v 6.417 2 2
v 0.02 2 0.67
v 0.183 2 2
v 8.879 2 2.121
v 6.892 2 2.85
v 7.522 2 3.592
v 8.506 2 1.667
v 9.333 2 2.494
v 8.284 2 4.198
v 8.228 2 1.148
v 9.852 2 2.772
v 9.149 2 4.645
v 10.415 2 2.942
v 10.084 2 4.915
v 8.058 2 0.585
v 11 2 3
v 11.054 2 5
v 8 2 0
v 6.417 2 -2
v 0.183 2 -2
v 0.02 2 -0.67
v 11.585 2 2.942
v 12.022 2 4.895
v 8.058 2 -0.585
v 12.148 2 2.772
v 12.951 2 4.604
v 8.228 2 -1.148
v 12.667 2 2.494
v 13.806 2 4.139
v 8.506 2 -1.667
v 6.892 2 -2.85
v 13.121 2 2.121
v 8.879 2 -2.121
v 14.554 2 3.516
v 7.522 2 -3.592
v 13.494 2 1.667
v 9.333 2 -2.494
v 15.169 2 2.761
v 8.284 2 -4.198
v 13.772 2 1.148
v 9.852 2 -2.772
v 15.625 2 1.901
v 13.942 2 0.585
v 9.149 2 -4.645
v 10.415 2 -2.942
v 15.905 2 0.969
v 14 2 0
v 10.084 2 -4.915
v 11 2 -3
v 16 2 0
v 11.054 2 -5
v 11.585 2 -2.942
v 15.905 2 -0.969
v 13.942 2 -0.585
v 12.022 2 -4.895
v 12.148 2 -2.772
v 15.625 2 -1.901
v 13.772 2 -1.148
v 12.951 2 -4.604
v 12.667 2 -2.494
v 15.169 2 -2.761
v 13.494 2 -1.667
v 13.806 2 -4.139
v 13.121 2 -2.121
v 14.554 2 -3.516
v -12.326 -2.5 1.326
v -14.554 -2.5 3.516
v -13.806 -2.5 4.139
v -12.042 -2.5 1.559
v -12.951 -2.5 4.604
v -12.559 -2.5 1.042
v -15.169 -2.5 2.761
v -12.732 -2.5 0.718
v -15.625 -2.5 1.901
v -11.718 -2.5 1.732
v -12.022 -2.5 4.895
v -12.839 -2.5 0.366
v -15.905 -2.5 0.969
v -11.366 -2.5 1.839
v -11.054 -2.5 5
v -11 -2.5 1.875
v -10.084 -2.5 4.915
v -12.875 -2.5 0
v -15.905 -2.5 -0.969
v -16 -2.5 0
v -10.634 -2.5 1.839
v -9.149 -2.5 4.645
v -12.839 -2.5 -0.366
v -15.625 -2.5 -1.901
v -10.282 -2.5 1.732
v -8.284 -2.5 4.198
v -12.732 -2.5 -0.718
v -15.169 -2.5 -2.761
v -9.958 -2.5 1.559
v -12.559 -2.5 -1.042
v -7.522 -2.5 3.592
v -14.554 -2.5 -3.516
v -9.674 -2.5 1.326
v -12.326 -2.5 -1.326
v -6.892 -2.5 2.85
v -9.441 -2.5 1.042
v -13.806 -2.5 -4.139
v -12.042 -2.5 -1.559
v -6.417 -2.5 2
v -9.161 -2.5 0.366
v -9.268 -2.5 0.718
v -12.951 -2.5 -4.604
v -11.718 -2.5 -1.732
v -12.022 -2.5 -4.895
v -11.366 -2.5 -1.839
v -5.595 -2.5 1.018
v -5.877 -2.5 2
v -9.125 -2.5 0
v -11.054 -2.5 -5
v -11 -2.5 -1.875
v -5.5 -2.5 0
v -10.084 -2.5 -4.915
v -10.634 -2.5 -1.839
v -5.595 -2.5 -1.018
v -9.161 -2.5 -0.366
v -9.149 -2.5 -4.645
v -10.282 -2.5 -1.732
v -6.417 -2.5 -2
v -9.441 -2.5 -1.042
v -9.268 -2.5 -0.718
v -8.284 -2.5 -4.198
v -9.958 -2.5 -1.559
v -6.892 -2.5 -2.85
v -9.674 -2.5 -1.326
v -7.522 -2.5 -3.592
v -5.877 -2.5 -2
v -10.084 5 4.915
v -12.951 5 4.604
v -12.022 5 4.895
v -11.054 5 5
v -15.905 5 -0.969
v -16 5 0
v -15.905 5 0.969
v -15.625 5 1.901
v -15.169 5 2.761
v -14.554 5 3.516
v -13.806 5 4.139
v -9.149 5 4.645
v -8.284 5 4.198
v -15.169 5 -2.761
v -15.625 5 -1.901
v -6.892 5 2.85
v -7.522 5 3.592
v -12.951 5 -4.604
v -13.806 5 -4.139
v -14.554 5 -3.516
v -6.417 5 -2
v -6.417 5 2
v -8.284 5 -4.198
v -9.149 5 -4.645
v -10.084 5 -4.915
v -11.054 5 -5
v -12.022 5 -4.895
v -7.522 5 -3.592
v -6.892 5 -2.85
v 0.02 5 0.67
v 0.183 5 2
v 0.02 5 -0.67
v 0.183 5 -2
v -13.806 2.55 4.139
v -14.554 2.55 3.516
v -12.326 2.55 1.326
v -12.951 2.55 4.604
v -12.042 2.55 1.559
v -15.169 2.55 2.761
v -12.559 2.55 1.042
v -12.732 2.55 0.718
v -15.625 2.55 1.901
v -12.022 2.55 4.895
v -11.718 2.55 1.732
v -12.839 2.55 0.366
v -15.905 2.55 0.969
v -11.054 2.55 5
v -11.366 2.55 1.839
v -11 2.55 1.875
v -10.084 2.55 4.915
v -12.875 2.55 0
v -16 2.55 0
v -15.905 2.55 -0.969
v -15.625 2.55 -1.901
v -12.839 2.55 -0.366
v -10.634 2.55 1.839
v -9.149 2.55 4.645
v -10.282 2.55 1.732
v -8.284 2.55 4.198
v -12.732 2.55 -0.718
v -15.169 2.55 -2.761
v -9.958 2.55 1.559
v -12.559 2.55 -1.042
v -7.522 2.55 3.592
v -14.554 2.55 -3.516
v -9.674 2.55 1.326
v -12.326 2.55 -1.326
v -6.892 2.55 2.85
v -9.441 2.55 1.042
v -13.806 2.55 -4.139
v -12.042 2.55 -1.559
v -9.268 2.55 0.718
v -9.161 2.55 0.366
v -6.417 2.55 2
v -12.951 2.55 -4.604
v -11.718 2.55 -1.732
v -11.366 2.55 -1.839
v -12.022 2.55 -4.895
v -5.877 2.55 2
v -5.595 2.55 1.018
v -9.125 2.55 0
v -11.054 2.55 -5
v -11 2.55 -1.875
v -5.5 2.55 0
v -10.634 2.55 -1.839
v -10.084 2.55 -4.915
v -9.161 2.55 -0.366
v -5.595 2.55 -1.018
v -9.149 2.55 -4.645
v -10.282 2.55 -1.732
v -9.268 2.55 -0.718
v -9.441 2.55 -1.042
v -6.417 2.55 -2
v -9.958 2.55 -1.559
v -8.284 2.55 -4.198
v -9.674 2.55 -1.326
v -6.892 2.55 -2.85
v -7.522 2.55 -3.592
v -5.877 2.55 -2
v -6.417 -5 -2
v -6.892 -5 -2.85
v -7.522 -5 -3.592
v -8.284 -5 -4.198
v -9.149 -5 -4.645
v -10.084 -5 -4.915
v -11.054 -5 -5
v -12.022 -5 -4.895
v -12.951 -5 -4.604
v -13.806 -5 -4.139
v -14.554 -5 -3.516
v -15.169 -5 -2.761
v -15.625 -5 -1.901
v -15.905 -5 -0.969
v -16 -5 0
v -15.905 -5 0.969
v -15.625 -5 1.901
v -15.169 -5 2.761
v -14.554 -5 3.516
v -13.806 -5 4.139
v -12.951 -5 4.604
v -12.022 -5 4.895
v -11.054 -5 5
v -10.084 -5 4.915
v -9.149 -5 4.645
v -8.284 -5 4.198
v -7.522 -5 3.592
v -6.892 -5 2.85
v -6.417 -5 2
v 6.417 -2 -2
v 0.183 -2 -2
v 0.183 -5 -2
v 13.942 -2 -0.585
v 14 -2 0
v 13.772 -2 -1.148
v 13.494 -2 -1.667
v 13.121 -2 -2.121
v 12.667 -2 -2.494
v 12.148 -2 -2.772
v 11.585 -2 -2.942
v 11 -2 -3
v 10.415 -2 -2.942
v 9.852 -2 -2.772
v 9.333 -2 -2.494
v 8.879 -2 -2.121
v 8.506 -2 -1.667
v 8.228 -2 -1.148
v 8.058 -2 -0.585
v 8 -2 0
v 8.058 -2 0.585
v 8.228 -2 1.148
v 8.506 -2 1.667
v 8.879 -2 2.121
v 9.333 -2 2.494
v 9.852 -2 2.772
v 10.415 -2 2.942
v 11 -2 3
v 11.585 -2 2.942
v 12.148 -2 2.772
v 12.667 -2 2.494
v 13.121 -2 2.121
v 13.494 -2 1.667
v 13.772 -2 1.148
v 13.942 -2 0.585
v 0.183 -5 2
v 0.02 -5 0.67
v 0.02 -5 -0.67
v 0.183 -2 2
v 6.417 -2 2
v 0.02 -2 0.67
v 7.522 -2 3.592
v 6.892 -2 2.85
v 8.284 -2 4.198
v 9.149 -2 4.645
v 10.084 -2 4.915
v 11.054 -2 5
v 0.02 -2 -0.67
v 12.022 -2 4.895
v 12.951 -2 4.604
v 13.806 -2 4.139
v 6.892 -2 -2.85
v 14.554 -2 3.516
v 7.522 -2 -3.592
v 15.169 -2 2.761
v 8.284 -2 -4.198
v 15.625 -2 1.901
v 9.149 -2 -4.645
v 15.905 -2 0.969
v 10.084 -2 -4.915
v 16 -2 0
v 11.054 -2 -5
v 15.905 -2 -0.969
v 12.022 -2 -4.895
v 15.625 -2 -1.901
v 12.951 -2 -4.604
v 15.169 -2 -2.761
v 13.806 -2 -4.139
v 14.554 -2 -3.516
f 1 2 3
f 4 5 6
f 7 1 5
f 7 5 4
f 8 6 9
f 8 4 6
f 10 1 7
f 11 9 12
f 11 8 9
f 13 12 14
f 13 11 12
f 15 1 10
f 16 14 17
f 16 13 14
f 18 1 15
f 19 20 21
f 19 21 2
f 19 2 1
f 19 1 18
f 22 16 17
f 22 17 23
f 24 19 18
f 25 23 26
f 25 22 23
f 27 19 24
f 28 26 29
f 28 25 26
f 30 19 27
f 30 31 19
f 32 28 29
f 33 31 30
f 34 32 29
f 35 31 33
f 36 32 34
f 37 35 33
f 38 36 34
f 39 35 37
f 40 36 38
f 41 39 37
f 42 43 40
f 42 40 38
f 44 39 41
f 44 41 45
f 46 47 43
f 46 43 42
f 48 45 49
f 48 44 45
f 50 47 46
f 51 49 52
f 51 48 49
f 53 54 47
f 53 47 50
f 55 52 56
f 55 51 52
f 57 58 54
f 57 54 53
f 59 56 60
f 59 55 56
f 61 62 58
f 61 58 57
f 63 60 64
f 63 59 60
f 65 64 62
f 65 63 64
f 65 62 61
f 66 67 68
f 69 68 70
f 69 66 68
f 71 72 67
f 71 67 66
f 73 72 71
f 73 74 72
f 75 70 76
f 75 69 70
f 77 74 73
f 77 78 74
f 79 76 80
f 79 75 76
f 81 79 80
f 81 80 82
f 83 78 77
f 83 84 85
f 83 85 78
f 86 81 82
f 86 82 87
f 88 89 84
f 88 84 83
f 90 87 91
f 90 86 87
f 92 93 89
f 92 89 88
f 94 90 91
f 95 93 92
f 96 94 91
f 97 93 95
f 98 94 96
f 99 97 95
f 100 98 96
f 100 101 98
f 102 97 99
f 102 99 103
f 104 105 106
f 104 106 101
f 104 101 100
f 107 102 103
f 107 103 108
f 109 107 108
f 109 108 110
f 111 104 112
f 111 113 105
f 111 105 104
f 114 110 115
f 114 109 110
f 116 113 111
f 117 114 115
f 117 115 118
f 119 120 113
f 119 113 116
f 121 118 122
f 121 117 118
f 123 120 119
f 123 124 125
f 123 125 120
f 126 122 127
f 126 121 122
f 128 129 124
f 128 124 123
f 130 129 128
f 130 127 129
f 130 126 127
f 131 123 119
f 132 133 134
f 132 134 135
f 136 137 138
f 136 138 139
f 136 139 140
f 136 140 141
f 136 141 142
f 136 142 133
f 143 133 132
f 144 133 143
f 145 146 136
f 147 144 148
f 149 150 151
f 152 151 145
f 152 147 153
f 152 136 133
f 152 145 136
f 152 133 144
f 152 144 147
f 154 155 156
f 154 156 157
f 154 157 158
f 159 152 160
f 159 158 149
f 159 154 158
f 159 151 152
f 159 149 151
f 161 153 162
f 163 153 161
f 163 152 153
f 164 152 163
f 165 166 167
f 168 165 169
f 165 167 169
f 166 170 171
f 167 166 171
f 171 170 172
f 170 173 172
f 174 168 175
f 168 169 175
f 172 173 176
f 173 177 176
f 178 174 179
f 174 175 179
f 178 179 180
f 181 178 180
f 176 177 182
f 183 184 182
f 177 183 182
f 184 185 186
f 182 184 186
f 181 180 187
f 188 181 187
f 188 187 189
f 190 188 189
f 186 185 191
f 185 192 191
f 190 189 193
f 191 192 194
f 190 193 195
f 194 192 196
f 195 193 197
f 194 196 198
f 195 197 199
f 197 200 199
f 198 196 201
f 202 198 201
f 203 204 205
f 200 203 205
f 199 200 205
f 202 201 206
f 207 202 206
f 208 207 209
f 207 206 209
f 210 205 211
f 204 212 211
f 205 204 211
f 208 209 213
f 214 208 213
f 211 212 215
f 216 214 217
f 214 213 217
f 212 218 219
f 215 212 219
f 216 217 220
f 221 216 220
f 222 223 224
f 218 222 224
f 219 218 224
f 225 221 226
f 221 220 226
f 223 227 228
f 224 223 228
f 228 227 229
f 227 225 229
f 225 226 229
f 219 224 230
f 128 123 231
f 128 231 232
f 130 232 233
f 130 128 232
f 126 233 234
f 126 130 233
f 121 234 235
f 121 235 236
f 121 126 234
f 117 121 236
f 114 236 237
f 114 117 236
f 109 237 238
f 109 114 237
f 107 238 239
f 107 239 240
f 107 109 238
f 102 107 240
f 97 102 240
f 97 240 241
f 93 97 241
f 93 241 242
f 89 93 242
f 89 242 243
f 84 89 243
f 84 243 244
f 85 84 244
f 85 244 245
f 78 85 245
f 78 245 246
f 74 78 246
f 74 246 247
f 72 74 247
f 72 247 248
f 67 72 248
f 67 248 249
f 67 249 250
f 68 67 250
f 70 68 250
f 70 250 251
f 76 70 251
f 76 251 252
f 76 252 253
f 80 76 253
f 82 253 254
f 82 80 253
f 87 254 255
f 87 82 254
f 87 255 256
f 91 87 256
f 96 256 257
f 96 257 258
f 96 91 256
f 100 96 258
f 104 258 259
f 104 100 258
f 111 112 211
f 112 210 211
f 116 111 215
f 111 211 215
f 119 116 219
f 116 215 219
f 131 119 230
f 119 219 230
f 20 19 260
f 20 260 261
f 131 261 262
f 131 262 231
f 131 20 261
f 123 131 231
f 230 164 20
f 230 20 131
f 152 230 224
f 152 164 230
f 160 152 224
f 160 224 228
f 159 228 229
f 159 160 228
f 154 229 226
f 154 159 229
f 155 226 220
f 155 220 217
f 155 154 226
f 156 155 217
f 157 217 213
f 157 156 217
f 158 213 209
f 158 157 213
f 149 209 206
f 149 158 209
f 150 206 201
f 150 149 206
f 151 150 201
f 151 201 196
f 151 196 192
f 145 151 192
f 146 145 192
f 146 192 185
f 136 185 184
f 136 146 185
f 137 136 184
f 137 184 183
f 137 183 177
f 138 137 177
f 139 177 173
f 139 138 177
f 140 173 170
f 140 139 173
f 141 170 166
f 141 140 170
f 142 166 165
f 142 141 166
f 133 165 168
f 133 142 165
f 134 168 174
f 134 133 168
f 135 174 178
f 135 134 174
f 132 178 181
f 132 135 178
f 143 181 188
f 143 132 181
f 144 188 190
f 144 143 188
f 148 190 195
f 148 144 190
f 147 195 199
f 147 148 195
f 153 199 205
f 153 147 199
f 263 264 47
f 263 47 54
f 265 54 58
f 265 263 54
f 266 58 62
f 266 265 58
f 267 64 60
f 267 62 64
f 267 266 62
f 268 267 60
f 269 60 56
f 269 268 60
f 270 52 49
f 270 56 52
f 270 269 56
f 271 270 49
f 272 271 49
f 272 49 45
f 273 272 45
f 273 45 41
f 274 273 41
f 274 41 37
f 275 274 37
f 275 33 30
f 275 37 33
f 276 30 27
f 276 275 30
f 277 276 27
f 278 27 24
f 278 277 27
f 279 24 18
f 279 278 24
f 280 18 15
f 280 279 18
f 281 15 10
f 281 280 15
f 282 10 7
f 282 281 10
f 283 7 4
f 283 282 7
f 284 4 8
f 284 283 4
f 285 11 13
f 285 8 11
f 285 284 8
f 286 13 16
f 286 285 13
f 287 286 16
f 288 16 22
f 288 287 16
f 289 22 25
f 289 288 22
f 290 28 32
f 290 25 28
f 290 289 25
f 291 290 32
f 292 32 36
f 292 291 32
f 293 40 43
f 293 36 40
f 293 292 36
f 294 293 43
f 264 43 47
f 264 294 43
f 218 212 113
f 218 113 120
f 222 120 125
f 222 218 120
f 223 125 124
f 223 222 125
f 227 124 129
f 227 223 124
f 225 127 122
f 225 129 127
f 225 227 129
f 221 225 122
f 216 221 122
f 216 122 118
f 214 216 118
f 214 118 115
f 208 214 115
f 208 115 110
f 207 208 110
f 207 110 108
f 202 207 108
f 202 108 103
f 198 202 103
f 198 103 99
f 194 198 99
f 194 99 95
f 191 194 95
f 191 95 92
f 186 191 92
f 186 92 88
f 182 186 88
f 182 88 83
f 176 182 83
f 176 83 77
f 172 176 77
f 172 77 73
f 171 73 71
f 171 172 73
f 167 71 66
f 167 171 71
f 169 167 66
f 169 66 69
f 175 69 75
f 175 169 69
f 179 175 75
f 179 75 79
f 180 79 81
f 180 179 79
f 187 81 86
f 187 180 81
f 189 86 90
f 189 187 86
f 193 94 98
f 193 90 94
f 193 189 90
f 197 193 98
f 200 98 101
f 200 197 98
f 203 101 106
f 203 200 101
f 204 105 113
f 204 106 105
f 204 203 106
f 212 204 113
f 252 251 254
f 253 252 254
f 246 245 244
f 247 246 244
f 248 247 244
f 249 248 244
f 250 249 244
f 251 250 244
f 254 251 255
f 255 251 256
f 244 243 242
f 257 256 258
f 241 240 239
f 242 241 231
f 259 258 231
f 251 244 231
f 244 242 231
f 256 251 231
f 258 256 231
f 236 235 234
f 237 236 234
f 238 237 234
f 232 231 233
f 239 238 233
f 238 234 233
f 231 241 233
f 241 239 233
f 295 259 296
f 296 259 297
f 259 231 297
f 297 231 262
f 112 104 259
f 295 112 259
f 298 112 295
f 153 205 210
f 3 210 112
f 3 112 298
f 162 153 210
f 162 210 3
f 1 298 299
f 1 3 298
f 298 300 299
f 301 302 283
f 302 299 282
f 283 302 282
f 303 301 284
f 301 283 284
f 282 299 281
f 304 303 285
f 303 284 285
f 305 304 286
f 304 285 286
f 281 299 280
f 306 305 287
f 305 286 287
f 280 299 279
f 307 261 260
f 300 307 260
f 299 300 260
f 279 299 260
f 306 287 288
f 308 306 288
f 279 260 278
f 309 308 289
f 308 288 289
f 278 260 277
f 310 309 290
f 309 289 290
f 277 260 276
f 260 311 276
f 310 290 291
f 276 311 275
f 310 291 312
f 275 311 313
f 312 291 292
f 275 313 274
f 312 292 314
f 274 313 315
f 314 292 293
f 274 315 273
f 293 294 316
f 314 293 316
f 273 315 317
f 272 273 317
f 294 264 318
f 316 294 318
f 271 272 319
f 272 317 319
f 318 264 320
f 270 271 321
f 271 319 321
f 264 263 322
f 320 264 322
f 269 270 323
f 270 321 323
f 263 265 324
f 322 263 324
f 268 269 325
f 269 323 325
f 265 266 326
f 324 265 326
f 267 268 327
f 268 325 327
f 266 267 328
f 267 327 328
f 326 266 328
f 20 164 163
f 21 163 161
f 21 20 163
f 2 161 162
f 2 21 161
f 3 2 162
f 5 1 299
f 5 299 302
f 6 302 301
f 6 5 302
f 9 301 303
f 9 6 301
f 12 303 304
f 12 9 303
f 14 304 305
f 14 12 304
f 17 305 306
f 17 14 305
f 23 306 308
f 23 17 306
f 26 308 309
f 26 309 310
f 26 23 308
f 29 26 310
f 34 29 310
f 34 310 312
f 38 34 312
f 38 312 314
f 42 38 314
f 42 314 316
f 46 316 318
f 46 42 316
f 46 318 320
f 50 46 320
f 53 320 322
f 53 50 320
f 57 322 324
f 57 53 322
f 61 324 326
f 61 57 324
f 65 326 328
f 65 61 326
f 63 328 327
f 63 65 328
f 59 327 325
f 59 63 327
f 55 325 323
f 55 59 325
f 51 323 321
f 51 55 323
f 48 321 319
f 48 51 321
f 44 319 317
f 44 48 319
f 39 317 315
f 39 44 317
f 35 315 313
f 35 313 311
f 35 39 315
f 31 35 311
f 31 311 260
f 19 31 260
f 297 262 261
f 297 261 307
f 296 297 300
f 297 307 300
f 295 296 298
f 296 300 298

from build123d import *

# Parameters (mm, degrees)
SKETCH2_R               = 5
SKETCH2_R_2             = 1.875
SKETCH2_R_3             = 3
BOSS_EXTRUDE1_DEPTH     = 5
CUT_EXTRUDE1_START      = 2
SKETCH3_R               = 11
CUT_EXTRUDE1_DEPTH      = 4
SKETCH3_3_R             = 5.5
CUT_EXTRUDE2_DEPTH      = 2.55
CUT_EXTRUDE2_DEPTH_BACK = 2.5
SKETCH5_R               = 1.875
BOSS_EXTRUDE2_DEPTH     = 10


with BuildPart() as part:
    # Sketch2 → Boss-Extrude1 (new body, symmetric)
    with BuildSketch(Plane(origin=(0, 0, 0), x_dir=(1, 0, 0), z_dir=(0, 1, 0))):
        with Locations((-11, 0)):
            Circle(SKETCH2_R)
        with Locations((-11, 0)):
            Circle(SKETCH2_R_2, mode=Mode.SUBTRACT)
        with Locations((11, 0)):
            Circle(SKETCH2_R)
        with Locations((11, 0)):
            Circle(SKETCH2_R_3, mode=Mode.SUBTRACT)
        with BuildLine():
            ThreePointArc((-6, 0), (-6.105468435, -1.021548218), (-6.417424305, -2))
            Line((-6.417424305, -2), (6.417424305, -2))
            ThreePointArc((6.417424305, -2), (6, 0), (6.417424305, 2))
            Line((6.417424305, 2), (-6.417424305, 2))
            ThreePointArc((-6.417424305, 2), (-6.105468435, 1.021548218), (-6, 0))
        make_face()
    extrude(amount=BOSS_EXTRUDE1_DEPTH, both=True)

    # Sketch3 → Cut-Extrude1 (cut, through all)
    with BuildSketch(Plane(origin=(0, 0, 0), x_dir=(1, 0, 0), z_dir=(0, 1, 0)).offset(CUT_EXTRUDE1_START)):
        with Locations((11, 0)):
            Circle(SKETCH3_R)
    cut_extrude1 = extrude(amount=CUT_EXTRUDE1_DEPTH, mode=Mode.SUBTRACT)

    # Mirror2: Cut-Extrude1 across plane
    add(cut_extrude1.mirror(Plane.ZX), mode=Mode.SUBTRACT)

    # Sketch3<3> → Cut-Extrude2 (cut, two sides)
    with BuildSketch(Plane(origin=(0, 0, 0), x_dir=(1, 0, 0), z_dir=(0, 1, 0))) as cut_extrude2_sk:
        with Locations((-11, 0)):
            Circle(SKETCH3_3_R)
    extrude(amount=CUT_EXTRUDE2_DEPTH, mode=Mode.SUBTRACT)
    extrude(cut_extrude2_sk.sketch, amount=-CUT_EXTRUDE2_DEPTH_BACK, mode=Mode.SUBTRACT)

    # Sketch5 → Boss-Extrude2 (add)
    with BuildSketch(Plane(origin=(0, 5, 0), x_dir=(1, 0, 0), z_dir=(0, 1, 0))):
        with Locations((-11, 0)):
            Circle(SKETCH5_R)
    extrude(amount=-BOSS_EXTRUDE2_DEPTH)


solid = part.part
